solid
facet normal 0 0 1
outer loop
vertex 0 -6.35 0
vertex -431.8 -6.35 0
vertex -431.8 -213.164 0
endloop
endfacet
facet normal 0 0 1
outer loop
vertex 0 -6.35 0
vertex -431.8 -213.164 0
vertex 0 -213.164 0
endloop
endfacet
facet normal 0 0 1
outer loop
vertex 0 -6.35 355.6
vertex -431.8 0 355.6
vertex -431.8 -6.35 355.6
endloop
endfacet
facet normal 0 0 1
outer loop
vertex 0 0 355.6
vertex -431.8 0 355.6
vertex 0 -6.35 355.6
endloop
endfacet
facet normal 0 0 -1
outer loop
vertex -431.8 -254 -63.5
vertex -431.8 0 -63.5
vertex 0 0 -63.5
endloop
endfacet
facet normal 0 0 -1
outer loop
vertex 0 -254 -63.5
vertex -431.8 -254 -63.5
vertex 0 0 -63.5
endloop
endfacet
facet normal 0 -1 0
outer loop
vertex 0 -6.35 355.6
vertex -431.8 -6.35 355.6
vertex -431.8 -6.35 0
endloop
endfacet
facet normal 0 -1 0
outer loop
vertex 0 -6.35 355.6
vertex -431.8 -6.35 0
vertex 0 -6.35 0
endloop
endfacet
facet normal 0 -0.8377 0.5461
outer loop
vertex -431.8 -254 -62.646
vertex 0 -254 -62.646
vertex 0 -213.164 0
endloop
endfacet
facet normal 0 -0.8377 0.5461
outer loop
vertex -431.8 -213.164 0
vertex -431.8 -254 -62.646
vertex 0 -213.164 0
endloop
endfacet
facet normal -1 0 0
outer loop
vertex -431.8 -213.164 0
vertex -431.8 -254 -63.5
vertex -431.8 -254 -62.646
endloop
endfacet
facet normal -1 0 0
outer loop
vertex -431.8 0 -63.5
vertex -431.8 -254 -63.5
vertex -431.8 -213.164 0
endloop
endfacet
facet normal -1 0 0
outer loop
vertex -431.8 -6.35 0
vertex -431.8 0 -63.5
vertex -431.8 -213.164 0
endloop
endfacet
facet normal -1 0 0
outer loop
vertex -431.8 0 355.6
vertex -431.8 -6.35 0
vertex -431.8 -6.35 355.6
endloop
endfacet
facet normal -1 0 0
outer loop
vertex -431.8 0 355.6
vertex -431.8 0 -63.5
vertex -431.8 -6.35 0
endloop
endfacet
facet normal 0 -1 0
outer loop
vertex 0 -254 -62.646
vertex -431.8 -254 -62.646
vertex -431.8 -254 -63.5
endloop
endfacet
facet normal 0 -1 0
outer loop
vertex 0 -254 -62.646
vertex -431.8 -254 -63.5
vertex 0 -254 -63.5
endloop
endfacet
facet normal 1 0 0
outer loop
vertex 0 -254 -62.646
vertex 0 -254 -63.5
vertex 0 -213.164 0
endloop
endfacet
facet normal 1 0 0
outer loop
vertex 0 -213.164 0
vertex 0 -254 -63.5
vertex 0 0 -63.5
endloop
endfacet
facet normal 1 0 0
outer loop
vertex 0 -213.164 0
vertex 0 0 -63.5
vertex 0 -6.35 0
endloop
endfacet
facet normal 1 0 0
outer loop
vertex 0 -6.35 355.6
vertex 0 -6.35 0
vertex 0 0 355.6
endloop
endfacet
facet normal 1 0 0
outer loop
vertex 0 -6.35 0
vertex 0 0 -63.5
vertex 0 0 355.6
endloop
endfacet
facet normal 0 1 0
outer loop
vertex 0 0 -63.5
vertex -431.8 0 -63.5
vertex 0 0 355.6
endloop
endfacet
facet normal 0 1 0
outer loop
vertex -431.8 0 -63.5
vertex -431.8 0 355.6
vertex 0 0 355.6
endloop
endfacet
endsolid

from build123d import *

# Parameters (mm, degrees)
F0_W     = 431.8
F0_H     = 355.6
F1_DEPTH = 6.35
F2_W     = 431.8
F2_H     = 63.5
F3_DEPTH = 254
F5_DEPTH = 431.801


with BuildPart() as f1:
    # F0 (on Front) → F1 (new body)
    with BuildSketch(Plane.XZ):
        with Locations((-215.9, 177.8)):
            Rectangle(F0_W, F0_H)
    extrude(amount=F1_DEPTH)

    # F2 (on Front) → F3 (join)
    with BuildSketch(Plane.XZ):
        with Locations((-215.9, -31.75)):
            Rectangle(F2_W, F2_H)
    extrude(amount=F3_DEPTH)

    # F4 (on Right) → F5 (cut, through all)
    with BuildSketch(Plane.YZ):
        Polygon((-330.205292, 41.198432), (-255.739987, -65.315232), (-172.791287, 61.935604), align=None)
    extrude(amount=-F5_DEPTH, mode=Mode.SUBTRACT)


solid = f1.part
